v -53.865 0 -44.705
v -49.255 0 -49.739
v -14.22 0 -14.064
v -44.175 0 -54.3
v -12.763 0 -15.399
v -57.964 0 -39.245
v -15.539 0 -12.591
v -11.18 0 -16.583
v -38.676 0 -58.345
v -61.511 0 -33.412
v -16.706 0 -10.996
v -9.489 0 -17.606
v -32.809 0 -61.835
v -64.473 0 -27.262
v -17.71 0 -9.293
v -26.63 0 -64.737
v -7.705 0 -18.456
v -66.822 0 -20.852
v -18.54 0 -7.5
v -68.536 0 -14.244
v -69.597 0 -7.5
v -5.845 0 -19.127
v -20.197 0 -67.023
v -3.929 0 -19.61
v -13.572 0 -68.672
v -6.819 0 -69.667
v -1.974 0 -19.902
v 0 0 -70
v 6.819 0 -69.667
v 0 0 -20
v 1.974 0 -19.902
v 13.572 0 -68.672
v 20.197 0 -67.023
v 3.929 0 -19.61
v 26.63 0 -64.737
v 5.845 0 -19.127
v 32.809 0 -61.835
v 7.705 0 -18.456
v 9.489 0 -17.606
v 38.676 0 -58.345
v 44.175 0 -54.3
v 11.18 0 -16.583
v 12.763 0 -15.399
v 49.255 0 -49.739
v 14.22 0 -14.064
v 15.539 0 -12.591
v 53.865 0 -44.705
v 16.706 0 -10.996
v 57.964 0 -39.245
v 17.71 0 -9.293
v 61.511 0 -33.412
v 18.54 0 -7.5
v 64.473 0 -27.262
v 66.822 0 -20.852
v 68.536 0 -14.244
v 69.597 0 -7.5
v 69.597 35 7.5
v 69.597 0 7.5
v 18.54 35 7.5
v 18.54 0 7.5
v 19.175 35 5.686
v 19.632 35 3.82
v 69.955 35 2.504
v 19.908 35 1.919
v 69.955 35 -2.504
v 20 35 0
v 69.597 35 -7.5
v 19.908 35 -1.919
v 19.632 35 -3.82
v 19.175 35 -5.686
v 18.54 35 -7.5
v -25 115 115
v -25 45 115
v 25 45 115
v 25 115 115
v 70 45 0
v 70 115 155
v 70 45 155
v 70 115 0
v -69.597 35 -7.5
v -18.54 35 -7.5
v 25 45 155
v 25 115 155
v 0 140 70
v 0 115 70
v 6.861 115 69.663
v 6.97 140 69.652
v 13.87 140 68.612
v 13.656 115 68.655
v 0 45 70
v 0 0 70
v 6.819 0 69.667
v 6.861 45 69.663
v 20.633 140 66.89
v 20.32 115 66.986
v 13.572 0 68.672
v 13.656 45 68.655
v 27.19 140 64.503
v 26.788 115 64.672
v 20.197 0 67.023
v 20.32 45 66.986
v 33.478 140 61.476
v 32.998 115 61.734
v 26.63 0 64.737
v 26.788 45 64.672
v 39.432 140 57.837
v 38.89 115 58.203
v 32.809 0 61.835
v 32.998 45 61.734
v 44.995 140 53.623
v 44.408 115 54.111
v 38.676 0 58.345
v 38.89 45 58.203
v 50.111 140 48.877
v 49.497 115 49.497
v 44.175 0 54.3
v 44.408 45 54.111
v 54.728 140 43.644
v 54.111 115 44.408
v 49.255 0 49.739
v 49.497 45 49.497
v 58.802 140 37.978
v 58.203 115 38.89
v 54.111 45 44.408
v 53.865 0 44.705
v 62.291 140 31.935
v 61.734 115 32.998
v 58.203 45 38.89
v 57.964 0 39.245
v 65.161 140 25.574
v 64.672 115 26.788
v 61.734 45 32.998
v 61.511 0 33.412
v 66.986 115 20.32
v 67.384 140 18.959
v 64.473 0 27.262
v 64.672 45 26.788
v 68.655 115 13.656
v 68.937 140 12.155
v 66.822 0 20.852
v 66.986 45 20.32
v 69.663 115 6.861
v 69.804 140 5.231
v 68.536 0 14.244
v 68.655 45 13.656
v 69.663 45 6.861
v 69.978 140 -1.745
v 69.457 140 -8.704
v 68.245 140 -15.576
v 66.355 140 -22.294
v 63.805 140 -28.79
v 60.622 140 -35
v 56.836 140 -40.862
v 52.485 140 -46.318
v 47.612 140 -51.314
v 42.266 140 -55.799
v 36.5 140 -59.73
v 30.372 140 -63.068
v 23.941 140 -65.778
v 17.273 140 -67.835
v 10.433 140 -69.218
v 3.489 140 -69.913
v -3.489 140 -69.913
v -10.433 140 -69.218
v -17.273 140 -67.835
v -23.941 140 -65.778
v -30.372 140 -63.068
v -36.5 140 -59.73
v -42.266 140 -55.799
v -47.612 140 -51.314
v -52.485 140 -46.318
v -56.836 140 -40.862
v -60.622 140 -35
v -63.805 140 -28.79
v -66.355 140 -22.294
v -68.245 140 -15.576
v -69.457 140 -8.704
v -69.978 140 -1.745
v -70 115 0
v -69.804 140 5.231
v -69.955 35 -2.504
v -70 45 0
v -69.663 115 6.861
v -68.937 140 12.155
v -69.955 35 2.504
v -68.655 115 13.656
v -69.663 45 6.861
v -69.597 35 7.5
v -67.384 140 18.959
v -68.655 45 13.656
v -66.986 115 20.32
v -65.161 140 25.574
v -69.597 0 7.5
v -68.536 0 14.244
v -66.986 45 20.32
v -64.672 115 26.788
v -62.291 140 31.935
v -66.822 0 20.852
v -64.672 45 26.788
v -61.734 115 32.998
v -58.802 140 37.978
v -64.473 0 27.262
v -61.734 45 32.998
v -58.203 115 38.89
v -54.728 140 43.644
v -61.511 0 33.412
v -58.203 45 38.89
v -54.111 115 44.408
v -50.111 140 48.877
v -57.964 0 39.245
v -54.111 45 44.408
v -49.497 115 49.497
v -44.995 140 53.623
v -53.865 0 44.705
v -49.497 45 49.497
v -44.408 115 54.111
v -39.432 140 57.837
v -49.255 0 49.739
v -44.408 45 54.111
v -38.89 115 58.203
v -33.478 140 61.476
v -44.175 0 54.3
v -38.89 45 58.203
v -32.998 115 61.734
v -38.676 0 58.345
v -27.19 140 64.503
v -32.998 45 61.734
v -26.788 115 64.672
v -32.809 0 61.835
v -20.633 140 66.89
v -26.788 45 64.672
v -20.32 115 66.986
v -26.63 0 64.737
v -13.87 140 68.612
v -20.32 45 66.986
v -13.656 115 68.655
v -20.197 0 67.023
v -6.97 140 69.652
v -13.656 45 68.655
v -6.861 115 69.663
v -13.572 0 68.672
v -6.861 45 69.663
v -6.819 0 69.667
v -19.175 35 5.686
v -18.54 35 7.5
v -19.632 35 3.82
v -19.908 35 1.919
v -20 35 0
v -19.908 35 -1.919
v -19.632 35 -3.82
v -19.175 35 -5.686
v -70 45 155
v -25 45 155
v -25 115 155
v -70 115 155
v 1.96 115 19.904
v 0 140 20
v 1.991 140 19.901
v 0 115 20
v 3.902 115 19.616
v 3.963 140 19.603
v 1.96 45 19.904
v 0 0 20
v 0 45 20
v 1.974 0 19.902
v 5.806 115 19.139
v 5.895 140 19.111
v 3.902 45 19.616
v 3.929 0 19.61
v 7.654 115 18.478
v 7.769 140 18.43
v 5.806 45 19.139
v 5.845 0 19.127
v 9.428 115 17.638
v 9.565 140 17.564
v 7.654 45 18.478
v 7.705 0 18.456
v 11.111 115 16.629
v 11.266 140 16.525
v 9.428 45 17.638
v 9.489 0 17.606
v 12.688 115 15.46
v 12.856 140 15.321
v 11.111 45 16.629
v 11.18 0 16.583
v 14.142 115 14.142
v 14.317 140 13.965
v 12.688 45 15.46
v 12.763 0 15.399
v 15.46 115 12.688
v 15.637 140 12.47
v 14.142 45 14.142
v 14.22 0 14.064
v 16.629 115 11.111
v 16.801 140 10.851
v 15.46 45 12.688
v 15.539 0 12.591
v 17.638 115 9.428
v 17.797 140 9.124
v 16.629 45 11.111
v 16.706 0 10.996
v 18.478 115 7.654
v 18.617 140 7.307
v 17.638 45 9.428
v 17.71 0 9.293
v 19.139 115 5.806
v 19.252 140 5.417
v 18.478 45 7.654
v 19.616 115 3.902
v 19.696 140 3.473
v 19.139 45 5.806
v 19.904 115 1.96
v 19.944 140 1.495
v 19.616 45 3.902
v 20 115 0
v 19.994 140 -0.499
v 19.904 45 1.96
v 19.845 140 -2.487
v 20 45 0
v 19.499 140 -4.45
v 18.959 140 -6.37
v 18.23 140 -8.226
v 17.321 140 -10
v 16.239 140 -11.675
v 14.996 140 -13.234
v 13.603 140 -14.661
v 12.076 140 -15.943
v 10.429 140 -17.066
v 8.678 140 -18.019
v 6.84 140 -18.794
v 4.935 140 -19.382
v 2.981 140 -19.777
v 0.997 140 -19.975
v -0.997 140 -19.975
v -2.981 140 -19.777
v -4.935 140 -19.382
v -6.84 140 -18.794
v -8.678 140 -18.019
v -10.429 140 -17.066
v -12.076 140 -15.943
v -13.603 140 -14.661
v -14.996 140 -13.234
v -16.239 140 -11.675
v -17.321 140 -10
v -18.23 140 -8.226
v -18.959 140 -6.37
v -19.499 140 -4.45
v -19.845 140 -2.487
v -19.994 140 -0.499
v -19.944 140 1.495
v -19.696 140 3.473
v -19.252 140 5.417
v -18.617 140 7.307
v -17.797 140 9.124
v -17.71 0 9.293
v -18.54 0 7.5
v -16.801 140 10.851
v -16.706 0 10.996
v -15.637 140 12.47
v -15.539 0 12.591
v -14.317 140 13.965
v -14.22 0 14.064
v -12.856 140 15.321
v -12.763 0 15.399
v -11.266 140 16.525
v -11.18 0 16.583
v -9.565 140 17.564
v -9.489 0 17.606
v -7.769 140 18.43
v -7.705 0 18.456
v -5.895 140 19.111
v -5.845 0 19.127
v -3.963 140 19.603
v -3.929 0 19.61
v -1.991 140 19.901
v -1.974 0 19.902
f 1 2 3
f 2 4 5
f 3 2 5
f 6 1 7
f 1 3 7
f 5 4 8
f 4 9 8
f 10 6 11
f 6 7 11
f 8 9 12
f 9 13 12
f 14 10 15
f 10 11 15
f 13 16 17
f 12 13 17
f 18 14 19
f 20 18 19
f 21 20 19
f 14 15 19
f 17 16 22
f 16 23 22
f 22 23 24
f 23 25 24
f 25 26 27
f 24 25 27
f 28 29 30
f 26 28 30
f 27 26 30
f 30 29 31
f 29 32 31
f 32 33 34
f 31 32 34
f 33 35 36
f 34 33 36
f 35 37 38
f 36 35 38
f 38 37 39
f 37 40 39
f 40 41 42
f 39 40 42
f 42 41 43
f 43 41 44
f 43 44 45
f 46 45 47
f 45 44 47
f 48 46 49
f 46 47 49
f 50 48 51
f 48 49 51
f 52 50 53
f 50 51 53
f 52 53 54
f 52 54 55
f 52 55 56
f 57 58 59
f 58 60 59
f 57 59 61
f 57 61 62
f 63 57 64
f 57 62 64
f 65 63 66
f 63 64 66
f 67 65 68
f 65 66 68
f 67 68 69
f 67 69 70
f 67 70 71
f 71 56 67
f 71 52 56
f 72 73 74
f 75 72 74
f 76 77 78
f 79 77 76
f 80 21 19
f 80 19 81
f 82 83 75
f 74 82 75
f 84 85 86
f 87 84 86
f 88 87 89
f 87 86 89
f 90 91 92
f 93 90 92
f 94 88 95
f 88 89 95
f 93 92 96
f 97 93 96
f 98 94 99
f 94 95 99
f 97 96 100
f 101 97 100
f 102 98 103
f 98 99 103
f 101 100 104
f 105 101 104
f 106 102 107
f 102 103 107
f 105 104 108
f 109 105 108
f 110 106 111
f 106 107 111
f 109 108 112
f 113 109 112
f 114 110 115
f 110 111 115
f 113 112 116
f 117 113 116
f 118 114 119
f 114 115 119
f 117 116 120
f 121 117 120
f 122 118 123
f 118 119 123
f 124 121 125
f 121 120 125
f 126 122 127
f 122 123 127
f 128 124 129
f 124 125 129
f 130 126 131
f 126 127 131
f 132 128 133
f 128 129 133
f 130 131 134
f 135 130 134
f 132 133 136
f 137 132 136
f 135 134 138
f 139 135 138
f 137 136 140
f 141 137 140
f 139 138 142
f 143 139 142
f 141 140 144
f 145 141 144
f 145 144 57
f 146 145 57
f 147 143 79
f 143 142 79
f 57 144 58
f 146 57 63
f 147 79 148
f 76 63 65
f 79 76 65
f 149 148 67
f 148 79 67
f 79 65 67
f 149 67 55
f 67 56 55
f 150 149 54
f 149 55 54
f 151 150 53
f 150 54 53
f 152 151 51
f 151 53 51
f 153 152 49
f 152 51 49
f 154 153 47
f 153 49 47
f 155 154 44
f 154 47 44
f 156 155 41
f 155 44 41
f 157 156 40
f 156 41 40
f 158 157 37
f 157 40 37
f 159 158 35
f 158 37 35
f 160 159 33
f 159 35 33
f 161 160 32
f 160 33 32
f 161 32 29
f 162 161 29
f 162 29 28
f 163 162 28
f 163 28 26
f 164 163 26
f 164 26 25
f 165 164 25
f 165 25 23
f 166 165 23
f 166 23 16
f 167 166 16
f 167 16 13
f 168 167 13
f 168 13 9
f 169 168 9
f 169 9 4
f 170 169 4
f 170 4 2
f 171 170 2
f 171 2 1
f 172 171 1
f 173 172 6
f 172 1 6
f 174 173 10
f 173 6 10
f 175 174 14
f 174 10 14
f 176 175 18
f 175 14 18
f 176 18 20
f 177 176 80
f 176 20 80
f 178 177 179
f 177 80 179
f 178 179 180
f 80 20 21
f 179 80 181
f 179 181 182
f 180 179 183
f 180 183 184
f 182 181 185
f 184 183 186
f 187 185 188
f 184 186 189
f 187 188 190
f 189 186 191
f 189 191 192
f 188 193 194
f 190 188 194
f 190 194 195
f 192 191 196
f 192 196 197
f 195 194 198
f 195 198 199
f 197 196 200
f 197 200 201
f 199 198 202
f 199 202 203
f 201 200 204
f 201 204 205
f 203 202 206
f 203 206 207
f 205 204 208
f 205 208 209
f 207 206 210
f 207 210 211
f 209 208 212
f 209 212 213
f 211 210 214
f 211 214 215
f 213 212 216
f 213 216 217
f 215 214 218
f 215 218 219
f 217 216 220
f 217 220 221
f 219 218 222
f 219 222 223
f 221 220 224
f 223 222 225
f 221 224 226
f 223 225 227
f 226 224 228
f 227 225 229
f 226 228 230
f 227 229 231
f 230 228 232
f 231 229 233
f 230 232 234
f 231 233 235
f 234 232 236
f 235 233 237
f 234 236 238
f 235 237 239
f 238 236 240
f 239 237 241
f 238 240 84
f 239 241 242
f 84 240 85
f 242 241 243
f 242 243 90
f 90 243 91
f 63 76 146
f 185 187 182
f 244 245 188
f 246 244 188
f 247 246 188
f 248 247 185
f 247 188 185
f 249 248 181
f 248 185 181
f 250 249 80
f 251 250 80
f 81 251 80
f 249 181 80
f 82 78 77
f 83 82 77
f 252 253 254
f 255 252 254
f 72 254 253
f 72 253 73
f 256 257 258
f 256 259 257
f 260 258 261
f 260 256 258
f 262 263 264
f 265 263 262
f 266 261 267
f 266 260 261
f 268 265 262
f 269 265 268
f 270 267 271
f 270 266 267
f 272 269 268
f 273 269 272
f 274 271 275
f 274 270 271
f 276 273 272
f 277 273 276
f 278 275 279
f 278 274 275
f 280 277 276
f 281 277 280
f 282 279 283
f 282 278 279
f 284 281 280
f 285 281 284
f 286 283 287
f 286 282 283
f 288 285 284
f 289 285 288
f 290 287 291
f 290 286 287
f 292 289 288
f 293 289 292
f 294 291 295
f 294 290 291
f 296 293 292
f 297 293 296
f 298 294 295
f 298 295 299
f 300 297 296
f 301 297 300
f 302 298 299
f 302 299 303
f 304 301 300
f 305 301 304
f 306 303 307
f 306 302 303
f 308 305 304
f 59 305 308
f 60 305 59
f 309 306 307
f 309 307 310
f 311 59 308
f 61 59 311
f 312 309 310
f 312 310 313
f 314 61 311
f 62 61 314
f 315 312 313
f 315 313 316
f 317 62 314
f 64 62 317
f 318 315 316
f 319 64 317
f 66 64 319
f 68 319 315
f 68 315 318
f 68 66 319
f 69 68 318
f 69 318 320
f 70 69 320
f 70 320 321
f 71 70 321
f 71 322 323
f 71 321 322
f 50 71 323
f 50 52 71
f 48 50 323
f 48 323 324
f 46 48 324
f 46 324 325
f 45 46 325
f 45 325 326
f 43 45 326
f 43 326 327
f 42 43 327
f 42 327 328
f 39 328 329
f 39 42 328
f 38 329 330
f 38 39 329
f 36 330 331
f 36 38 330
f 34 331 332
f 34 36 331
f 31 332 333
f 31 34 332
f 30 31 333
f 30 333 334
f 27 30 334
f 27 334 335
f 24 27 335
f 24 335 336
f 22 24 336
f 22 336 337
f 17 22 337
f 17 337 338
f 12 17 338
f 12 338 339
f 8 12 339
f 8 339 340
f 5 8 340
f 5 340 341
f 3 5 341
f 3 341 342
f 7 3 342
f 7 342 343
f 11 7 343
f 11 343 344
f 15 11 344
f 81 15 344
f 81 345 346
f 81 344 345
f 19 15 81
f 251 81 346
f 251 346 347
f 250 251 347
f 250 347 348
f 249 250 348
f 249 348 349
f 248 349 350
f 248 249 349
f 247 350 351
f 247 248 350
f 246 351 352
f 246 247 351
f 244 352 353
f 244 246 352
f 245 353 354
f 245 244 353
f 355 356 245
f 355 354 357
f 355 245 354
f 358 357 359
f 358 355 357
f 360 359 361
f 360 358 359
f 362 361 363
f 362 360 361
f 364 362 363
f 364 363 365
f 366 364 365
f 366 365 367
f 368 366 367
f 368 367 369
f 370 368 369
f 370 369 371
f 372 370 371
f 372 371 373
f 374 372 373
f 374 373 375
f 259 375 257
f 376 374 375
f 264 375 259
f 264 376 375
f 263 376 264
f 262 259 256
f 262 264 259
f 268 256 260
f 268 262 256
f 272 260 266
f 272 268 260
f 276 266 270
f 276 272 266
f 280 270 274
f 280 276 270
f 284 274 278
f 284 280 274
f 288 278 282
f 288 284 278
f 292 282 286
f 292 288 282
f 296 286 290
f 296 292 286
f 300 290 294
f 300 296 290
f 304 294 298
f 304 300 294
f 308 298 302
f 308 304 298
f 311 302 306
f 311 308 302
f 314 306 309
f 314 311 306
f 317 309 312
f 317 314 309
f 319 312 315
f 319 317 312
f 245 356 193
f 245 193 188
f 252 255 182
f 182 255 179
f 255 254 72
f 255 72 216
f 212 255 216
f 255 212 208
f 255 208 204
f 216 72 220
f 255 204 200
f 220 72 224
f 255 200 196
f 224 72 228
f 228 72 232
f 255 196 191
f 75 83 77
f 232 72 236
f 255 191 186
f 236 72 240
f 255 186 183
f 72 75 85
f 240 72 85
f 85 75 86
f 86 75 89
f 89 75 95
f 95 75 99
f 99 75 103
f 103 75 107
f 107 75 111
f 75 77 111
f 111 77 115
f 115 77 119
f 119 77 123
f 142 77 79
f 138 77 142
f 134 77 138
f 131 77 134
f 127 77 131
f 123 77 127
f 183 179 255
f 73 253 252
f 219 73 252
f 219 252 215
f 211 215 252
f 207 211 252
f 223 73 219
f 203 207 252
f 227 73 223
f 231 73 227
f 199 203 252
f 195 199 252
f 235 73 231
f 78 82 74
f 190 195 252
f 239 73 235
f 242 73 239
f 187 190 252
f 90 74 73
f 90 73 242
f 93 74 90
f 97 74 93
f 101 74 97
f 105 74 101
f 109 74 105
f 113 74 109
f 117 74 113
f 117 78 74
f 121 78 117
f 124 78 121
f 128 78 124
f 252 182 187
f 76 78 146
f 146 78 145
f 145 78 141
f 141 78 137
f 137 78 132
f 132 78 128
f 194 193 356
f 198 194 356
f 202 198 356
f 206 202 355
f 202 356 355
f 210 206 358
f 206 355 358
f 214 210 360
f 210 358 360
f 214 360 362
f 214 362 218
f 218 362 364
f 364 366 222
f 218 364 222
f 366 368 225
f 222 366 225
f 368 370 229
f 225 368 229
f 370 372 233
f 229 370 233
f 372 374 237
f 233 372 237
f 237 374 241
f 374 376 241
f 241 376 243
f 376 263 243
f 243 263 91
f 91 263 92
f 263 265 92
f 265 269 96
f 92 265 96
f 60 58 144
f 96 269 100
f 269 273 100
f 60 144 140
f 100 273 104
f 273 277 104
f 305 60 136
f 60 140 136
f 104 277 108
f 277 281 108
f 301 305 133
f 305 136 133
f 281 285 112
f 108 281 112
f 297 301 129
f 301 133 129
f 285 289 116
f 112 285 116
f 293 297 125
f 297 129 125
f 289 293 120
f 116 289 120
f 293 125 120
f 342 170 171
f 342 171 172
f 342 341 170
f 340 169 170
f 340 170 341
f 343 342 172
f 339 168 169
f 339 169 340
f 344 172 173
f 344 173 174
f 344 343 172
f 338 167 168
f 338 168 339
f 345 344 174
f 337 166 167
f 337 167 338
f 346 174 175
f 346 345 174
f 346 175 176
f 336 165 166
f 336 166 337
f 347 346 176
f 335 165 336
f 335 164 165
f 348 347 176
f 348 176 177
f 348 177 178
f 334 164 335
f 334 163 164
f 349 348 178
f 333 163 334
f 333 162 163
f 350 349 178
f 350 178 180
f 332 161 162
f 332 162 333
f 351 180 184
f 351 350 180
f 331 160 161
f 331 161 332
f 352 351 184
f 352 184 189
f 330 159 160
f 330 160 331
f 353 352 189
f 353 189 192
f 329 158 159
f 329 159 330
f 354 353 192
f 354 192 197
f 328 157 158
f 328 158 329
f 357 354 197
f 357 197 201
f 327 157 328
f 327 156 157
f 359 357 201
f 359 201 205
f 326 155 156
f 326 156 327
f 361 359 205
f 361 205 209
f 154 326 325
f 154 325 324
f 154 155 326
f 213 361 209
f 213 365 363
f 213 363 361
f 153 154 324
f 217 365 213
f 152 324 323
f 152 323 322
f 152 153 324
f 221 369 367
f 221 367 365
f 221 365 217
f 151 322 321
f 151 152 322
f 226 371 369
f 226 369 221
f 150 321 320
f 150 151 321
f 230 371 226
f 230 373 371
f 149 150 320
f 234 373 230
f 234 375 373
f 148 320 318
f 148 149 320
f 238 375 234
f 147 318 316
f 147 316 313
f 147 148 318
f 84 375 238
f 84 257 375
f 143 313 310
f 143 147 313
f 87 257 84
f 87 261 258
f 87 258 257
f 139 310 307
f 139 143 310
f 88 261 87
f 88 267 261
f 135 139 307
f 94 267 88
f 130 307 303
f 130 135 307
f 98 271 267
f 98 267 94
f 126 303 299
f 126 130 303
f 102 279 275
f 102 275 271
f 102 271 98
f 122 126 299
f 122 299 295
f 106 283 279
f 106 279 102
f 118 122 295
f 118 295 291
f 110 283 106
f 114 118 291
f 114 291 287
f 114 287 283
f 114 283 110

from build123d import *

# Parameters (mm, degrees)
ESQUISSE2_R                  = 70
ESQUISSE2_R_2                = 20
BOSS_EXTRU_1_DEPTH           = 140
ENL_V_MAT_EXTRU_1_DEPTH      = 172.464281995
ENL_V_MAT_EXTRU_1_DEPTH_BACK = 172.464281995
ESQUISSE3_W                  = 15
ESQUISSE3_H                  = 70
ESQUISSE7_W                  = 155
ESQUISSE7_H                  = 70
BOSS_EXTRU_3_DEPTH           = 70
ENL_V_MAT_EXTRU_5_DEPTH      = 206.304651676
ENL_V_MAT_EXTRU_5_DEPTH_BACK = 206.304651676
ESQUISSE11_W                 = 50
ESQUISSE11_H                 = 80
ESQUISSE10_R                 = 20
ENL_V_MAT_EXTRU_4_DEPTH      = 180


with BuildPart() as part:
    # Esquisse2 → Boss.-Extru.1 (new body)
    with BuildSketch(Plane(origin=(0, 0, 0), x_dir=(1, 0, 0), z_dir=(0, 1, 0))):
        with Locations(Location((0, 0, 0), (0, 0, 270))):
            Circle(ESQUISSE2_R)
        with Locations(Location((0, 0, 0), (0, 0, 270))):
            Circle(ESQUISSE2_R_2, mode=Mode.SUBTRACT)
    extrude(amount=BOSS_EXTRU_1_DEPTH)

    # Esquisse3 → Enlèv. mat.-Extru.1 (cut, two sides: drawn at the far end of the back side and taken through both)
    with BuildSketch(Plane(origin=(0, 0, 0), x_dir=(0, 0, -1), z_dir=(1, 0, 0)).offset(-ENL_V_MAT_EXTRU_1_DEPTH_BACK)):
        Rectangle(ESQUISSE3_W, ESQUISSE3_H)
    extrude(amount=ENL_V_MAT_EXTRU_1_DEPTH + ENL_V_MAT_EXTRU_1_DEPTH_BACK, mode=Mode.SUBTRACT)

    # Esquisse7 → Boss.-Extru.3 (add, symmetric)
    with BuildSketch(Plane(origin=(0, 0, 0), x_dir=(0, 0, -1), z_dir=(1, 0, 0))):
        with Locations((-77.5, 80)):
            Rectangle(ESQUISSE7_W, ESQUISSE7_H)
    extrude(amount=BOSS_EXTRU_3_DEPTH, both=True)

    # Esquisse11 → Enlèv. mat.-Extru.5 (cut, two sides: drawn at the far end of the back side and taken through both)
    with BuildSketch(Plane(origin=(0, 115, 0), x_dir=(1, 0, 0), z_dir=(0, 1, 0)).offset(-ENL_V_MAT_EXTRU_5_DEPTH_BACK)):
        with Locations((0, -155)):
            Rectangle(ESQUISSE11_W, ESQUISSE11_H)
    extrude(amount=ENL_V_MAT_EXTRU_5_DEPTH + ENL_V_MAT_EXTRU_5_DEPTH_BACK, mode=Mode.SUBTRACT)

    # Esquisse10 → Enlèv. mat.-Extru.4 (cut, symmetric)
    with BuildSketch(Plane(origin=(0, 140, 0), x_dir=(1, 0, 0), z_dir=(0, 1, 0))):
        with Locations(Location((0, 0, 0), (0, 0, 22.024312837))):
            Circle(ESQUISSE10_R)
    extrude(amount=ENL_V_MAT_EXTRU_4_DEPTH, both=True, mode=Mode.SUBTRACT)


solid = part.part
